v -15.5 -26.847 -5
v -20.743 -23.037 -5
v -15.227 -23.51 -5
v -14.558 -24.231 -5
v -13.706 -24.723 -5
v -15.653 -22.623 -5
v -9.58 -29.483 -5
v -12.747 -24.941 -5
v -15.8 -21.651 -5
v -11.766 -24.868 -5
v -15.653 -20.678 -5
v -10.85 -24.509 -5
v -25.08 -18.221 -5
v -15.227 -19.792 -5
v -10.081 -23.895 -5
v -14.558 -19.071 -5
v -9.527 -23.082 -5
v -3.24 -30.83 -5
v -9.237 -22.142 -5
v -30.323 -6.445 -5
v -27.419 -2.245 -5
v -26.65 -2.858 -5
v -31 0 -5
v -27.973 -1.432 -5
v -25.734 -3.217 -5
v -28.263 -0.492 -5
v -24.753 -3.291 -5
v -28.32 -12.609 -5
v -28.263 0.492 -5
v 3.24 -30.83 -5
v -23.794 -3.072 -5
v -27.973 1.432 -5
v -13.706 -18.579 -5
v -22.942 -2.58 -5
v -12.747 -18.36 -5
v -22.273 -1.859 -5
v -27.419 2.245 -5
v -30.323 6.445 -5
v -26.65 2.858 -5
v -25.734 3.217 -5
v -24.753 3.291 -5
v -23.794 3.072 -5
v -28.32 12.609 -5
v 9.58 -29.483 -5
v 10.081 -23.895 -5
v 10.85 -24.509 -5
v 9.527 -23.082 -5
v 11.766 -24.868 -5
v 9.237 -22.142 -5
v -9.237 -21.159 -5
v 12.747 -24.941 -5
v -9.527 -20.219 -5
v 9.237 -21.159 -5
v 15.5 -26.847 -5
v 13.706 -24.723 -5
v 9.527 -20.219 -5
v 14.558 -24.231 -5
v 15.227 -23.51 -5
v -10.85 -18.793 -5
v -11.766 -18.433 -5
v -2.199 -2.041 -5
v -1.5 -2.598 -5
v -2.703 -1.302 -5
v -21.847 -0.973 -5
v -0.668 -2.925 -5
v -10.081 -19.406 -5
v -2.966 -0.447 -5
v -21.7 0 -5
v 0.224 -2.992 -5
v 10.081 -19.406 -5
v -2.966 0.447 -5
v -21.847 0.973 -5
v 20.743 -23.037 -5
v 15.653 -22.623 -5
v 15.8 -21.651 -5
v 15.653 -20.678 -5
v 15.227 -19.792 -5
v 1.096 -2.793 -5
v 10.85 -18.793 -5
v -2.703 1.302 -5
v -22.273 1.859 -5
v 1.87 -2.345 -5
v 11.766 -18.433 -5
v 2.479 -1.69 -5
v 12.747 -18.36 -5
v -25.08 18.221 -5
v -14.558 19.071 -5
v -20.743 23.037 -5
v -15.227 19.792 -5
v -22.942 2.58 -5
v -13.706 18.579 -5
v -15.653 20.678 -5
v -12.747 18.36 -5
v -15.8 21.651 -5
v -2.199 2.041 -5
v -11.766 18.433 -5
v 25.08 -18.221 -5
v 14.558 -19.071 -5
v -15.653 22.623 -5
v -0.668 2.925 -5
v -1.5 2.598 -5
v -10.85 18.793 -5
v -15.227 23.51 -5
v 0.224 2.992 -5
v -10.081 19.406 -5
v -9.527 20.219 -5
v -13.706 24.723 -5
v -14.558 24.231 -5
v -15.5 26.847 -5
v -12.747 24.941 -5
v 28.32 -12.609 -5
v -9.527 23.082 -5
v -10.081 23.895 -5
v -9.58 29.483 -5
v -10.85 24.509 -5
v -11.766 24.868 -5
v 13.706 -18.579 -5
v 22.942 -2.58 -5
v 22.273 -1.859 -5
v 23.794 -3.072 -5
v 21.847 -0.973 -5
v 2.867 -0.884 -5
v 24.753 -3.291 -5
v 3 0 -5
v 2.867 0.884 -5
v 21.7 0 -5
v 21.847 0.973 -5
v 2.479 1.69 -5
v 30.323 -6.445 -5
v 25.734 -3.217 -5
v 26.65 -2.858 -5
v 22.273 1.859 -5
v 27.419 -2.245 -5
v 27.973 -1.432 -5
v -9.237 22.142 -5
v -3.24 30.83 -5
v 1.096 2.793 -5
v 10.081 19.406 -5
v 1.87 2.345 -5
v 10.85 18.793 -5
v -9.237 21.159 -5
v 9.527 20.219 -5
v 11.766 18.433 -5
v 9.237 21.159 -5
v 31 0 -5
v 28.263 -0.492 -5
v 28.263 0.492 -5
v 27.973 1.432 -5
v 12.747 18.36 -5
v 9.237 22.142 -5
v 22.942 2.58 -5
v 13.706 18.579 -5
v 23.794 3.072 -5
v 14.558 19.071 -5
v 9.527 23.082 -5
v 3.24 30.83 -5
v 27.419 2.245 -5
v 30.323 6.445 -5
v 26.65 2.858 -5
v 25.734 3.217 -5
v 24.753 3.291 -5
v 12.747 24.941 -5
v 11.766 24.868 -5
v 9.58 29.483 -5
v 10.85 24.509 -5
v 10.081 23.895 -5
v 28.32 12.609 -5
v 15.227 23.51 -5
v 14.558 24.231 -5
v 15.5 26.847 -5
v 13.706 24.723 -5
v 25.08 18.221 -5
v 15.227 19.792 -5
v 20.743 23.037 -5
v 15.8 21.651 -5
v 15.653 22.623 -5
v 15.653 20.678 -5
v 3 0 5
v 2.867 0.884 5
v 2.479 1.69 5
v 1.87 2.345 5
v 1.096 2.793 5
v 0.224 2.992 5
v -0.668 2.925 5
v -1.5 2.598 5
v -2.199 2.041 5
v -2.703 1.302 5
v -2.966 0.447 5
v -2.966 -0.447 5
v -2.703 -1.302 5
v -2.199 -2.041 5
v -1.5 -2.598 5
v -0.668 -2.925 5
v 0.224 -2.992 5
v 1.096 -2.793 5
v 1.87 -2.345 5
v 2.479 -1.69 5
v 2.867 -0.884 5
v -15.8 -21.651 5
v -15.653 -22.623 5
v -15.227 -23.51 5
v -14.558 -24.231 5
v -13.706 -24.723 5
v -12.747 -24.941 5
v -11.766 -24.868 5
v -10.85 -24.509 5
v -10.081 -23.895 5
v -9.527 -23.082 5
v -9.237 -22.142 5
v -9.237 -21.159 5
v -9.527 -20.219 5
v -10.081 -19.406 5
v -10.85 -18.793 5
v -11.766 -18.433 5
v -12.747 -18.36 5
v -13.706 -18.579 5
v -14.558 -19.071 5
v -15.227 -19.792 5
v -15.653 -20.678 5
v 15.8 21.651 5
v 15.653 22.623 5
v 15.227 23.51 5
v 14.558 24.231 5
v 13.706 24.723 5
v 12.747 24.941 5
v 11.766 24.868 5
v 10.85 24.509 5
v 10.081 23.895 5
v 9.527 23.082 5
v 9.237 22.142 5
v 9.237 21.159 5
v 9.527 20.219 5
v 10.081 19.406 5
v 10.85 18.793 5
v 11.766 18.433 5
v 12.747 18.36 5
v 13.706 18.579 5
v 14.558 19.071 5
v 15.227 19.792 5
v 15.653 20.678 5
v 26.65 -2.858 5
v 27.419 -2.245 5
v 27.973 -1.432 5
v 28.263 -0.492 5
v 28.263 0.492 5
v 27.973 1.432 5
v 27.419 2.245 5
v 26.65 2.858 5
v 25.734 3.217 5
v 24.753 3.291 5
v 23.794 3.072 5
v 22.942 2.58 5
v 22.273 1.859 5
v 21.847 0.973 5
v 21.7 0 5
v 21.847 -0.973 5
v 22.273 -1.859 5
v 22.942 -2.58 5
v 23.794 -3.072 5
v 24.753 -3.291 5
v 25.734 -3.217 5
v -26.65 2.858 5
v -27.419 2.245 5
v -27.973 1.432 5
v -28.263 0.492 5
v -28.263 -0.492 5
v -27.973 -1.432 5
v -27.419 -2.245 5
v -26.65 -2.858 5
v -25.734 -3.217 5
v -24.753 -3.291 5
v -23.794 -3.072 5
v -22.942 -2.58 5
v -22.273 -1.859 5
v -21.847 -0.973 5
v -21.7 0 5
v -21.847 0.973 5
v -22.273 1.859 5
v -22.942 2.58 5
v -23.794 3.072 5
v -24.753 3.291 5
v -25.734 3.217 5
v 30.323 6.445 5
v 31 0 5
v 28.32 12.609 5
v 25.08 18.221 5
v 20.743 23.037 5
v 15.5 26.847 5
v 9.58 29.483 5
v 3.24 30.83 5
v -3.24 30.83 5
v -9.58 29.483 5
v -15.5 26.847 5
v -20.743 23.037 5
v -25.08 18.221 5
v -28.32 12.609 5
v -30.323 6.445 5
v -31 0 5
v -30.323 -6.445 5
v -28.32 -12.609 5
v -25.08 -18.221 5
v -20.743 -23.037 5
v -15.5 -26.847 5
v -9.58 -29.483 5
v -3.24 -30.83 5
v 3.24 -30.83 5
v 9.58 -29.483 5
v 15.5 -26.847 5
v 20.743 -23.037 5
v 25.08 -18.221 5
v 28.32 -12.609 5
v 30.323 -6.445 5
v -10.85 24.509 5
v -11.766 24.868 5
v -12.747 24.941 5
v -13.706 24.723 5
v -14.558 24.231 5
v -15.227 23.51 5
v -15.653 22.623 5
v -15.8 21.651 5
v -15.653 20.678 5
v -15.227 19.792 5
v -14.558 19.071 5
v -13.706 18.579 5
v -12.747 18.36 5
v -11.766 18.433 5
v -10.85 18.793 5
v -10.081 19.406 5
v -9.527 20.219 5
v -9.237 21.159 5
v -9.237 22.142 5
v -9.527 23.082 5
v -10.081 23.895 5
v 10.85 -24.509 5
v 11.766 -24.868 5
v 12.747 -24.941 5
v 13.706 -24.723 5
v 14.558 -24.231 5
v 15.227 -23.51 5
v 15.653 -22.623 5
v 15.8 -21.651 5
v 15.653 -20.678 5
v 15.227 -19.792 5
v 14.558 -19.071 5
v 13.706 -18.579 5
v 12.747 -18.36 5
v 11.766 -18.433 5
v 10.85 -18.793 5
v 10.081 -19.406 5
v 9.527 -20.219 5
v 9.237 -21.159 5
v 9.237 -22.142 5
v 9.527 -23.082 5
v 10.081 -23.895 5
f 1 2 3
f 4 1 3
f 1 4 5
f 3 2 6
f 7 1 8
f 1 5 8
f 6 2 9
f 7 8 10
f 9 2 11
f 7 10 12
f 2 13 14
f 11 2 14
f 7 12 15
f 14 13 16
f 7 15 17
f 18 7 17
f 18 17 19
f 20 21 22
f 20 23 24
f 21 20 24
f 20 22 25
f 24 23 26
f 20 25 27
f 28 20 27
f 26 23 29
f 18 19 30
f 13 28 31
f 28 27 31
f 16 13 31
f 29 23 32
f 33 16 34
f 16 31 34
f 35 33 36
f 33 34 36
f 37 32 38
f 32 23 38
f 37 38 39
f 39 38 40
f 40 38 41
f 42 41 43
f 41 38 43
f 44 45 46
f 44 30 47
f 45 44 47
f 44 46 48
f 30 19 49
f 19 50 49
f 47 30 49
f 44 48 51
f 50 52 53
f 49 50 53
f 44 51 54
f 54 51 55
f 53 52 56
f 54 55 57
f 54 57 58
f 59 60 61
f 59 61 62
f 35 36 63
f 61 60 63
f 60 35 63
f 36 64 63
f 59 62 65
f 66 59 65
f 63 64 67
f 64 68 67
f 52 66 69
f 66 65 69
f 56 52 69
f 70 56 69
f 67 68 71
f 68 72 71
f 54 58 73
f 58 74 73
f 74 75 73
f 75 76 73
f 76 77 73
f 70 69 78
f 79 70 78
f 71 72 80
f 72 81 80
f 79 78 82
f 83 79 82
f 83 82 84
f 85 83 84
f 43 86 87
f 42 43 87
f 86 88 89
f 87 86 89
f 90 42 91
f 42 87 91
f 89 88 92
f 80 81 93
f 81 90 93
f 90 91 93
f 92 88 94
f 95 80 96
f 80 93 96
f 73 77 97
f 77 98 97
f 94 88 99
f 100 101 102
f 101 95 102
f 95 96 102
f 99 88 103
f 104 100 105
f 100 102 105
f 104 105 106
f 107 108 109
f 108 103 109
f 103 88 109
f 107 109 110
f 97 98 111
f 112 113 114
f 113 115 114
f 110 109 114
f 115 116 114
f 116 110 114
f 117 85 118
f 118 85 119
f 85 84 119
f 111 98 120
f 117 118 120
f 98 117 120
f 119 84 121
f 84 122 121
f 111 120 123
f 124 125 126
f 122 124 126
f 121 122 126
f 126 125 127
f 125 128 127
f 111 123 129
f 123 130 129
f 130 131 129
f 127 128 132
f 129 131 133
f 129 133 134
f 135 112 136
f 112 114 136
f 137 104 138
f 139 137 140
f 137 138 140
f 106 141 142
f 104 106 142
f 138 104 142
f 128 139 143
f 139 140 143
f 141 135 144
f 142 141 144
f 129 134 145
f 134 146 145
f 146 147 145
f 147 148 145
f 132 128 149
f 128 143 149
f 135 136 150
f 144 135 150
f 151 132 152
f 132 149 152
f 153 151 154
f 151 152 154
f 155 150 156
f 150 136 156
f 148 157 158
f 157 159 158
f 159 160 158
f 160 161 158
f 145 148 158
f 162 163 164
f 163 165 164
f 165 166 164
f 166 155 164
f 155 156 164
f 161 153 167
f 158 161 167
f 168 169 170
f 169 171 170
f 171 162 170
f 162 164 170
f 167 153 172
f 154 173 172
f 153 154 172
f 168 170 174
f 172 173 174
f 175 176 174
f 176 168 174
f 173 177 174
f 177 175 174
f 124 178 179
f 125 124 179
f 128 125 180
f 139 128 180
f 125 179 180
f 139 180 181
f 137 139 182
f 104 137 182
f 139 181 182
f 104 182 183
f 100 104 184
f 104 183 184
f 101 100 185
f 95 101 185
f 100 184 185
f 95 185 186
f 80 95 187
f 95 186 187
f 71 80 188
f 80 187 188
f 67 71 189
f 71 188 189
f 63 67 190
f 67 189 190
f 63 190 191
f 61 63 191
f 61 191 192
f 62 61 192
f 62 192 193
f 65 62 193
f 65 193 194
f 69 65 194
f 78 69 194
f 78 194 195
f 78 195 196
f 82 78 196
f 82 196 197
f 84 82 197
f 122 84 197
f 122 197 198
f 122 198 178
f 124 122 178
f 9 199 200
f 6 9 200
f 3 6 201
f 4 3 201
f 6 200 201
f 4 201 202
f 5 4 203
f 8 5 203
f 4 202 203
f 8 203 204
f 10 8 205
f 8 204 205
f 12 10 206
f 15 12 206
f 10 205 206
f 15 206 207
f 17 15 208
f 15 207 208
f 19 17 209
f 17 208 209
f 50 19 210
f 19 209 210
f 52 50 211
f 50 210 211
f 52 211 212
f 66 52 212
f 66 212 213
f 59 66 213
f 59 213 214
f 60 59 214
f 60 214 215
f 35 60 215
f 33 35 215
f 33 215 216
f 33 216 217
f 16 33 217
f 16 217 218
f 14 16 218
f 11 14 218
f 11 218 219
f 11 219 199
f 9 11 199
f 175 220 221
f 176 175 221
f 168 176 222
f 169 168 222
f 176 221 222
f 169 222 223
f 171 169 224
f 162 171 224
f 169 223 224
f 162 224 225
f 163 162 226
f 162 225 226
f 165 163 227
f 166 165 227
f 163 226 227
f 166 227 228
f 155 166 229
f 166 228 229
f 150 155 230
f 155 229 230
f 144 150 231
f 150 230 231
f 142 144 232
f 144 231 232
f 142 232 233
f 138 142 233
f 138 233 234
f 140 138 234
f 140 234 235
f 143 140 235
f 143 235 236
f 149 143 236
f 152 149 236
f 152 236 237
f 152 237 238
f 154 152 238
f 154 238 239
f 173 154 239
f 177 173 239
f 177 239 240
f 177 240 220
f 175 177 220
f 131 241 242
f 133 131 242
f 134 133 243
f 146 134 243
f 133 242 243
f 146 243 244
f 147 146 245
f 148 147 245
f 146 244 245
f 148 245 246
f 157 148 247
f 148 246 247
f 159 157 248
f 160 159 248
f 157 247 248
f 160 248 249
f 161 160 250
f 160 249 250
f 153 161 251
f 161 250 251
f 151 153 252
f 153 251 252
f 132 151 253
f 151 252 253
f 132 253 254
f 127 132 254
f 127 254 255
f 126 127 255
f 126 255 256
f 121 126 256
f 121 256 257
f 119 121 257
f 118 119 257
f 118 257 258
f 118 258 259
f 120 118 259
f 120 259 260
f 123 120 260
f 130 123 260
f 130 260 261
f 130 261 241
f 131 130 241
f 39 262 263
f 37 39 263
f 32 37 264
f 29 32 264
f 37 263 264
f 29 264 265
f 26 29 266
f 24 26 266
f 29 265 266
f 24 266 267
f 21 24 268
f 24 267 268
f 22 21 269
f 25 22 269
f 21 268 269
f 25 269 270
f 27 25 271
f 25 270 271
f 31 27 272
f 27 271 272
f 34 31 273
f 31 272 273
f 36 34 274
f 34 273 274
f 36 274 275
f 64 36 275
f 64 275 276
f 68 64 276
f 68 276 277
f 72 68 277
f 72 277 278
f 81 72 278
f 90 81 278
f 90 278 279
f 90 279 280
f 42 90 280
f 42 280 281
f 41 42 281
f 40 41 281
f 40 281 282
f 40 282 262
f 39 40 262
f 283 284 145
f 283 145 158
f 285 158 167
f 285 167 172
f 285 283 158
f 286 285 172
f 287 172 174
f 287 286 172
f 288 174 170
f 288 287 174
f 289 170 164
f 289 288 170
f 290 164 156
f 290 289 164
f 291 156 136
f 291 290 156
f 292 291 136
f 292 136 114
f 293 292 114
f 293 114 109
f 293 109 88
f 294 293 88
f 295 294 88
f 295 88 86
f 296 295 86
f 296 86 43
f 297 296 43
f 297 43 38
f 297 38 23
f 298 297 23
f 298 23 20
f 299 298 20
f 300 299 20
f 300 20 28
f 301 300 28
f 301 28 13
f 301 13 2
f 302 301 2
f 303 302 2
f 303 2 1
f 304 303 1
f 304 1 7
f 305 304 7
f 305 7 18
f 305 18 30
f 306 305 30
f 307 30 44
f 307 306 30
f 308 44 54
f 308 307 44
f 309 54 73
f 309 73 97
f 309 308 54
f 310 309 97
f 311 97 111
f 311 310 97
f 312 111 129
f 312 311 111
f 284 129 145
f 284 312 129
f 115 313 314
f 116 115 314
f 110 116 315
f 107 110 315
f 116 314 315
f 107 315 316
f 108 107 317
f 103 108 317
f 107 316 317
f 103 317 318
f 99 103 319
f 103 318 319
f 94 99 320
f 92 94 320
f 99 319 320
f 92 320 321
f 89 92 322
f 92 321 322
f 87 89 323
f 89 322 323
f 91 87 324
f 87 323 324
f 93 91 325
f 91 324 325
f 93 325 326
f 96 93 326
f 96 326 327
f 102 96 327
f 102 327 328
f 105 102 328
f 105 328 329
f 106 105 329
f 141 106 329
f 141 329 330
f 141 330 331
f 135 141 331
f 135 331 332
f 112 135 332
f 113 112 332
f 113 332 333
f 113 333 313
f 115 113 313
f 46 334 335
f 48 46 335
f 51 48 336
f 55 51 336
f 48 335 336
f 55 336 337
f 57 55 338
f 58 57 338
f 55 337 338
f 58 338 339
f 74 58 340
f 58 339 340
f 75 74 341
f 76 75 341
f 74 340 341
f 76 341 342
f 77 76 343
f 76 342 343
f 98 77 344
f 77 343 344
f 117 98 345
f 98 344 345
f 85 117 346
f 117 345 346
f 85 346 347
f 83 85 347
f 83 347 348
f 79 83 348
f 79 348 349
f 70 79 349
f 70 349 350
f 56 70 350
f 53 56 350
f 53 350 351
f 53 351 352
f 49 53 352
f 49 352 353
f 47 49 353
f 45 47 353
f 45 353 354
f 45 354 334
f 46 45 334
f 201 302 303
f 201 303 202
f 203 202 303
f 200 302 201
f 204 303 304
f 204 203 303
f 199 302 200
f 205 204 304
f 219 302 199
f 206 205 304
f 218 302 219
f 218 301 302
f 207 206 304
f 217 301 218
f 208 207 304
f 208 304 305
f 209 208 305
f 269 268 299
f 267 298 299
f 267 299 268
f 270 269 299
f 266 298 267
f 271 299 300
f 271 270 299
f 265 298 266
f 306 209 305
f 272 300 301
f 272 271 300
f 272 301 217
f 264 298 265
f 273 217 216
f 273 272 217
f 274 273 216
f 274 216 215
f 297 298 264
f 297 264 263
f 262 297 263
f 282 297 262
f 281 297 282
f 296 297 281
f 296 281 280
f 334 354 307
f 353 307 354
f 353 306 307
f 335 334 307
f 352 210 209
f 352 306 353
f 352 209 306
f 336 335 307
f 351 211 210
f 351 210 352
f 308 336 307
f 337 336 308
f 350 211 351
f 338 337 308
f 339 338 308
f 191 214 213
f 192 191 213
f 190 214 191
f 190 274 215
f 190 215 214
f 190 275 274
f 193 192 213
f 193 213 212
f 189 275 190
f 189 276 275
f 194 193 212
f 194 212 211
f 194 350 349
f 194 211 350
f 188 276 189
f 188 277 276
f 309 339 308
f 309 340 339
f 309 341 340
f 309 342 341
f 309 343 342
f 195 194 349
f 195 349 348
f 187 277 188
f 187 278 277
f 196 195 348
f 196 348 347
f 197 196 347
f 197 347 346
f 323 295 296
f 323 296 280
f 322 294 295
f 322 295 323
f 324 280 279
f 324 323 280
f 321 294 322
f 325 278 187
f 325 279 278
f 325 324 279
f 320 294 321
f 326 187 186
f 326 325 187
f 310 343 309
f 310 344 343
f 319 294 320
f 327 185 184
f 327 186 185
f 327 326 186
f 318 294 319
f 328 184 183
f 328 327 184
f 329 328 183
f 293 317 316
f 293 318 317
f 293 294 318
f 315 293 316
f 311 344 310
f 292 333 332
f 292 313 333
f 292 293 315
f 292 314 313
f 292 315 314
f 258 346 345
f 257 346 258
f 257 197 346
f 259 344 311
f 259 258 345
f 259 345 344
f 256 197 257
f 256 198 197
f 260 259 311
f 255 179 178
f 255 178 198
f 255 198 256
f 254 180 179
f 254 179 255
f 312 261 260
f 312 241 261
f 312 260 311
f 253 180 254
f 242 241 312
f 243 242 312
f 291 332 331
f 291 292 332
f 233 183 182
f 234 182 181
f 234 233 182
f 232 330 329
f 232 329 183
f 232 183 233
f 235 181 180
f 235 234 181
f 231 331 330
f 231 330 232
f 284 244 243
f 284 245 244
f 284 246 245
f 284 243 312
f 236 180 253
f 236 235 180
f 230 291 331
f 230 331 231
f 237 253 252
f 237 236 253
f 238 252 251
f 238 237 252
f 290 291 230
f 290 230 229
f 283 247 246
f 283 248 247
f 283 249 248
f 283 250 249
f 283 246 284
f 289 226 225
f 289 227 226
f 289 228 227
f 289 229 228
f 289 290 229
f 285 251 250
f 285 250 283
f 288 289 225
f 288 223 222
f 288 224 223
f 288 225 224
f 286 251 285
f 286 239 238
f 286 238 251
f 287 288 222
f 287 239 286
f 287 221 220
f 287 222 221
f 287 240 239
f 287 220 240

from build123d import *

# Parameters (mm, degrees)
ESBO_O2_W                = 80
ESBO_O2_H                = 117.2
RESSALTO_EXTRUS_O2_DEPTH = 5
ESBO_O3_R                = 3
CORTE_EXTRUS_O1_DEPTH    = 11
ESBO_O4_R                = 3.3
CORTE_EXTRUS_O2_DEPTH    = 34.5
PADR_OCIRCULAR1_COUNT    = 6
ESBO_O12_W               = 80
ESBO_O12_H               = 17.2
CORTE_EXTRUS_O7_DEPTH    = 11
ESBO_O13_W               = 80
ESBO_O13_H               = 100
ESBO_O13_R               = 31
CORTE_EXTRUS_O8_DEPTH    = 11


with BuildPart() as part:
    # Esboço2 → Ressalto-extrusão2 (new body, symmetric)
    with BuildSketch(Plane.XY):
        Rectangle(ESBO_O2_W, ESBO_O2_H)
    extrude(amount=RESSALTO_EXTRUS_O2_DEPTH, both=True)

    # Esboço3 → Corte-extrusão1 (cut, through all)
    with BuildSketch(Plane.XY.offset(5)):
        Circle(ESBO_O3_R)
    extrude(amount=-CORTE_EXTRUS_O1_DEPTH, mode=Mode.SUBTRACT)

    # Esboço4 → Corte-extrusão2 (cut)
    with BuildSketch(Plane.XY.offset(5)):
        with Locations((12.5, 21.650635095)):
            Circle(ESBO_O4_R)
    corte_extrus_o2 = extrude(amount=-CORTE_EXTRUS_O2_DEPTH, mode=Mode.SUBTRACT)

    # PadrãoCircular1: Corte-extrusão2 ×6 about axis
    padr_ocircular1_axis = Axis((0, 0, 0), (0, 0, 1))
    for i in range(1, PADR_OCIRCULAR1_COUNT):
        add(corte_extrus_o2.rotate(padr_ocircular1_axis, i * 360 / PADR_OCIRCULAR1_COUNT), mode=Mode.SUBTRACT)

    # Esboço12 → Corte-extrusão7 (cut, through all)
    with BuildSketch(Plane.XY.offset(5)):
        with Locations((0, -50)):
            Rectangle(ESBO_O12_W, ESBO_O12_H)
    extrude(amount=-CORTE_EXTRUS_O7_DEPTH, mode=Mode.SUBTRACT)

    # Esboço13 → Corte-extrusão8 (cut, through all)
    with BuildSketch(Plane.XY.offset(5)):
        with Locations((0, 8.6)):
            Rectangle(ESBO_O13_W, ESBO_O13_H)
        Circle(ESBO_O13_R, mode=Mode.SUBTRACT)
    extrude(amount=-CORTE_EXTRUS_O8_DEPTH, mode=Mode.SUBTRACT)


solid = part.part
